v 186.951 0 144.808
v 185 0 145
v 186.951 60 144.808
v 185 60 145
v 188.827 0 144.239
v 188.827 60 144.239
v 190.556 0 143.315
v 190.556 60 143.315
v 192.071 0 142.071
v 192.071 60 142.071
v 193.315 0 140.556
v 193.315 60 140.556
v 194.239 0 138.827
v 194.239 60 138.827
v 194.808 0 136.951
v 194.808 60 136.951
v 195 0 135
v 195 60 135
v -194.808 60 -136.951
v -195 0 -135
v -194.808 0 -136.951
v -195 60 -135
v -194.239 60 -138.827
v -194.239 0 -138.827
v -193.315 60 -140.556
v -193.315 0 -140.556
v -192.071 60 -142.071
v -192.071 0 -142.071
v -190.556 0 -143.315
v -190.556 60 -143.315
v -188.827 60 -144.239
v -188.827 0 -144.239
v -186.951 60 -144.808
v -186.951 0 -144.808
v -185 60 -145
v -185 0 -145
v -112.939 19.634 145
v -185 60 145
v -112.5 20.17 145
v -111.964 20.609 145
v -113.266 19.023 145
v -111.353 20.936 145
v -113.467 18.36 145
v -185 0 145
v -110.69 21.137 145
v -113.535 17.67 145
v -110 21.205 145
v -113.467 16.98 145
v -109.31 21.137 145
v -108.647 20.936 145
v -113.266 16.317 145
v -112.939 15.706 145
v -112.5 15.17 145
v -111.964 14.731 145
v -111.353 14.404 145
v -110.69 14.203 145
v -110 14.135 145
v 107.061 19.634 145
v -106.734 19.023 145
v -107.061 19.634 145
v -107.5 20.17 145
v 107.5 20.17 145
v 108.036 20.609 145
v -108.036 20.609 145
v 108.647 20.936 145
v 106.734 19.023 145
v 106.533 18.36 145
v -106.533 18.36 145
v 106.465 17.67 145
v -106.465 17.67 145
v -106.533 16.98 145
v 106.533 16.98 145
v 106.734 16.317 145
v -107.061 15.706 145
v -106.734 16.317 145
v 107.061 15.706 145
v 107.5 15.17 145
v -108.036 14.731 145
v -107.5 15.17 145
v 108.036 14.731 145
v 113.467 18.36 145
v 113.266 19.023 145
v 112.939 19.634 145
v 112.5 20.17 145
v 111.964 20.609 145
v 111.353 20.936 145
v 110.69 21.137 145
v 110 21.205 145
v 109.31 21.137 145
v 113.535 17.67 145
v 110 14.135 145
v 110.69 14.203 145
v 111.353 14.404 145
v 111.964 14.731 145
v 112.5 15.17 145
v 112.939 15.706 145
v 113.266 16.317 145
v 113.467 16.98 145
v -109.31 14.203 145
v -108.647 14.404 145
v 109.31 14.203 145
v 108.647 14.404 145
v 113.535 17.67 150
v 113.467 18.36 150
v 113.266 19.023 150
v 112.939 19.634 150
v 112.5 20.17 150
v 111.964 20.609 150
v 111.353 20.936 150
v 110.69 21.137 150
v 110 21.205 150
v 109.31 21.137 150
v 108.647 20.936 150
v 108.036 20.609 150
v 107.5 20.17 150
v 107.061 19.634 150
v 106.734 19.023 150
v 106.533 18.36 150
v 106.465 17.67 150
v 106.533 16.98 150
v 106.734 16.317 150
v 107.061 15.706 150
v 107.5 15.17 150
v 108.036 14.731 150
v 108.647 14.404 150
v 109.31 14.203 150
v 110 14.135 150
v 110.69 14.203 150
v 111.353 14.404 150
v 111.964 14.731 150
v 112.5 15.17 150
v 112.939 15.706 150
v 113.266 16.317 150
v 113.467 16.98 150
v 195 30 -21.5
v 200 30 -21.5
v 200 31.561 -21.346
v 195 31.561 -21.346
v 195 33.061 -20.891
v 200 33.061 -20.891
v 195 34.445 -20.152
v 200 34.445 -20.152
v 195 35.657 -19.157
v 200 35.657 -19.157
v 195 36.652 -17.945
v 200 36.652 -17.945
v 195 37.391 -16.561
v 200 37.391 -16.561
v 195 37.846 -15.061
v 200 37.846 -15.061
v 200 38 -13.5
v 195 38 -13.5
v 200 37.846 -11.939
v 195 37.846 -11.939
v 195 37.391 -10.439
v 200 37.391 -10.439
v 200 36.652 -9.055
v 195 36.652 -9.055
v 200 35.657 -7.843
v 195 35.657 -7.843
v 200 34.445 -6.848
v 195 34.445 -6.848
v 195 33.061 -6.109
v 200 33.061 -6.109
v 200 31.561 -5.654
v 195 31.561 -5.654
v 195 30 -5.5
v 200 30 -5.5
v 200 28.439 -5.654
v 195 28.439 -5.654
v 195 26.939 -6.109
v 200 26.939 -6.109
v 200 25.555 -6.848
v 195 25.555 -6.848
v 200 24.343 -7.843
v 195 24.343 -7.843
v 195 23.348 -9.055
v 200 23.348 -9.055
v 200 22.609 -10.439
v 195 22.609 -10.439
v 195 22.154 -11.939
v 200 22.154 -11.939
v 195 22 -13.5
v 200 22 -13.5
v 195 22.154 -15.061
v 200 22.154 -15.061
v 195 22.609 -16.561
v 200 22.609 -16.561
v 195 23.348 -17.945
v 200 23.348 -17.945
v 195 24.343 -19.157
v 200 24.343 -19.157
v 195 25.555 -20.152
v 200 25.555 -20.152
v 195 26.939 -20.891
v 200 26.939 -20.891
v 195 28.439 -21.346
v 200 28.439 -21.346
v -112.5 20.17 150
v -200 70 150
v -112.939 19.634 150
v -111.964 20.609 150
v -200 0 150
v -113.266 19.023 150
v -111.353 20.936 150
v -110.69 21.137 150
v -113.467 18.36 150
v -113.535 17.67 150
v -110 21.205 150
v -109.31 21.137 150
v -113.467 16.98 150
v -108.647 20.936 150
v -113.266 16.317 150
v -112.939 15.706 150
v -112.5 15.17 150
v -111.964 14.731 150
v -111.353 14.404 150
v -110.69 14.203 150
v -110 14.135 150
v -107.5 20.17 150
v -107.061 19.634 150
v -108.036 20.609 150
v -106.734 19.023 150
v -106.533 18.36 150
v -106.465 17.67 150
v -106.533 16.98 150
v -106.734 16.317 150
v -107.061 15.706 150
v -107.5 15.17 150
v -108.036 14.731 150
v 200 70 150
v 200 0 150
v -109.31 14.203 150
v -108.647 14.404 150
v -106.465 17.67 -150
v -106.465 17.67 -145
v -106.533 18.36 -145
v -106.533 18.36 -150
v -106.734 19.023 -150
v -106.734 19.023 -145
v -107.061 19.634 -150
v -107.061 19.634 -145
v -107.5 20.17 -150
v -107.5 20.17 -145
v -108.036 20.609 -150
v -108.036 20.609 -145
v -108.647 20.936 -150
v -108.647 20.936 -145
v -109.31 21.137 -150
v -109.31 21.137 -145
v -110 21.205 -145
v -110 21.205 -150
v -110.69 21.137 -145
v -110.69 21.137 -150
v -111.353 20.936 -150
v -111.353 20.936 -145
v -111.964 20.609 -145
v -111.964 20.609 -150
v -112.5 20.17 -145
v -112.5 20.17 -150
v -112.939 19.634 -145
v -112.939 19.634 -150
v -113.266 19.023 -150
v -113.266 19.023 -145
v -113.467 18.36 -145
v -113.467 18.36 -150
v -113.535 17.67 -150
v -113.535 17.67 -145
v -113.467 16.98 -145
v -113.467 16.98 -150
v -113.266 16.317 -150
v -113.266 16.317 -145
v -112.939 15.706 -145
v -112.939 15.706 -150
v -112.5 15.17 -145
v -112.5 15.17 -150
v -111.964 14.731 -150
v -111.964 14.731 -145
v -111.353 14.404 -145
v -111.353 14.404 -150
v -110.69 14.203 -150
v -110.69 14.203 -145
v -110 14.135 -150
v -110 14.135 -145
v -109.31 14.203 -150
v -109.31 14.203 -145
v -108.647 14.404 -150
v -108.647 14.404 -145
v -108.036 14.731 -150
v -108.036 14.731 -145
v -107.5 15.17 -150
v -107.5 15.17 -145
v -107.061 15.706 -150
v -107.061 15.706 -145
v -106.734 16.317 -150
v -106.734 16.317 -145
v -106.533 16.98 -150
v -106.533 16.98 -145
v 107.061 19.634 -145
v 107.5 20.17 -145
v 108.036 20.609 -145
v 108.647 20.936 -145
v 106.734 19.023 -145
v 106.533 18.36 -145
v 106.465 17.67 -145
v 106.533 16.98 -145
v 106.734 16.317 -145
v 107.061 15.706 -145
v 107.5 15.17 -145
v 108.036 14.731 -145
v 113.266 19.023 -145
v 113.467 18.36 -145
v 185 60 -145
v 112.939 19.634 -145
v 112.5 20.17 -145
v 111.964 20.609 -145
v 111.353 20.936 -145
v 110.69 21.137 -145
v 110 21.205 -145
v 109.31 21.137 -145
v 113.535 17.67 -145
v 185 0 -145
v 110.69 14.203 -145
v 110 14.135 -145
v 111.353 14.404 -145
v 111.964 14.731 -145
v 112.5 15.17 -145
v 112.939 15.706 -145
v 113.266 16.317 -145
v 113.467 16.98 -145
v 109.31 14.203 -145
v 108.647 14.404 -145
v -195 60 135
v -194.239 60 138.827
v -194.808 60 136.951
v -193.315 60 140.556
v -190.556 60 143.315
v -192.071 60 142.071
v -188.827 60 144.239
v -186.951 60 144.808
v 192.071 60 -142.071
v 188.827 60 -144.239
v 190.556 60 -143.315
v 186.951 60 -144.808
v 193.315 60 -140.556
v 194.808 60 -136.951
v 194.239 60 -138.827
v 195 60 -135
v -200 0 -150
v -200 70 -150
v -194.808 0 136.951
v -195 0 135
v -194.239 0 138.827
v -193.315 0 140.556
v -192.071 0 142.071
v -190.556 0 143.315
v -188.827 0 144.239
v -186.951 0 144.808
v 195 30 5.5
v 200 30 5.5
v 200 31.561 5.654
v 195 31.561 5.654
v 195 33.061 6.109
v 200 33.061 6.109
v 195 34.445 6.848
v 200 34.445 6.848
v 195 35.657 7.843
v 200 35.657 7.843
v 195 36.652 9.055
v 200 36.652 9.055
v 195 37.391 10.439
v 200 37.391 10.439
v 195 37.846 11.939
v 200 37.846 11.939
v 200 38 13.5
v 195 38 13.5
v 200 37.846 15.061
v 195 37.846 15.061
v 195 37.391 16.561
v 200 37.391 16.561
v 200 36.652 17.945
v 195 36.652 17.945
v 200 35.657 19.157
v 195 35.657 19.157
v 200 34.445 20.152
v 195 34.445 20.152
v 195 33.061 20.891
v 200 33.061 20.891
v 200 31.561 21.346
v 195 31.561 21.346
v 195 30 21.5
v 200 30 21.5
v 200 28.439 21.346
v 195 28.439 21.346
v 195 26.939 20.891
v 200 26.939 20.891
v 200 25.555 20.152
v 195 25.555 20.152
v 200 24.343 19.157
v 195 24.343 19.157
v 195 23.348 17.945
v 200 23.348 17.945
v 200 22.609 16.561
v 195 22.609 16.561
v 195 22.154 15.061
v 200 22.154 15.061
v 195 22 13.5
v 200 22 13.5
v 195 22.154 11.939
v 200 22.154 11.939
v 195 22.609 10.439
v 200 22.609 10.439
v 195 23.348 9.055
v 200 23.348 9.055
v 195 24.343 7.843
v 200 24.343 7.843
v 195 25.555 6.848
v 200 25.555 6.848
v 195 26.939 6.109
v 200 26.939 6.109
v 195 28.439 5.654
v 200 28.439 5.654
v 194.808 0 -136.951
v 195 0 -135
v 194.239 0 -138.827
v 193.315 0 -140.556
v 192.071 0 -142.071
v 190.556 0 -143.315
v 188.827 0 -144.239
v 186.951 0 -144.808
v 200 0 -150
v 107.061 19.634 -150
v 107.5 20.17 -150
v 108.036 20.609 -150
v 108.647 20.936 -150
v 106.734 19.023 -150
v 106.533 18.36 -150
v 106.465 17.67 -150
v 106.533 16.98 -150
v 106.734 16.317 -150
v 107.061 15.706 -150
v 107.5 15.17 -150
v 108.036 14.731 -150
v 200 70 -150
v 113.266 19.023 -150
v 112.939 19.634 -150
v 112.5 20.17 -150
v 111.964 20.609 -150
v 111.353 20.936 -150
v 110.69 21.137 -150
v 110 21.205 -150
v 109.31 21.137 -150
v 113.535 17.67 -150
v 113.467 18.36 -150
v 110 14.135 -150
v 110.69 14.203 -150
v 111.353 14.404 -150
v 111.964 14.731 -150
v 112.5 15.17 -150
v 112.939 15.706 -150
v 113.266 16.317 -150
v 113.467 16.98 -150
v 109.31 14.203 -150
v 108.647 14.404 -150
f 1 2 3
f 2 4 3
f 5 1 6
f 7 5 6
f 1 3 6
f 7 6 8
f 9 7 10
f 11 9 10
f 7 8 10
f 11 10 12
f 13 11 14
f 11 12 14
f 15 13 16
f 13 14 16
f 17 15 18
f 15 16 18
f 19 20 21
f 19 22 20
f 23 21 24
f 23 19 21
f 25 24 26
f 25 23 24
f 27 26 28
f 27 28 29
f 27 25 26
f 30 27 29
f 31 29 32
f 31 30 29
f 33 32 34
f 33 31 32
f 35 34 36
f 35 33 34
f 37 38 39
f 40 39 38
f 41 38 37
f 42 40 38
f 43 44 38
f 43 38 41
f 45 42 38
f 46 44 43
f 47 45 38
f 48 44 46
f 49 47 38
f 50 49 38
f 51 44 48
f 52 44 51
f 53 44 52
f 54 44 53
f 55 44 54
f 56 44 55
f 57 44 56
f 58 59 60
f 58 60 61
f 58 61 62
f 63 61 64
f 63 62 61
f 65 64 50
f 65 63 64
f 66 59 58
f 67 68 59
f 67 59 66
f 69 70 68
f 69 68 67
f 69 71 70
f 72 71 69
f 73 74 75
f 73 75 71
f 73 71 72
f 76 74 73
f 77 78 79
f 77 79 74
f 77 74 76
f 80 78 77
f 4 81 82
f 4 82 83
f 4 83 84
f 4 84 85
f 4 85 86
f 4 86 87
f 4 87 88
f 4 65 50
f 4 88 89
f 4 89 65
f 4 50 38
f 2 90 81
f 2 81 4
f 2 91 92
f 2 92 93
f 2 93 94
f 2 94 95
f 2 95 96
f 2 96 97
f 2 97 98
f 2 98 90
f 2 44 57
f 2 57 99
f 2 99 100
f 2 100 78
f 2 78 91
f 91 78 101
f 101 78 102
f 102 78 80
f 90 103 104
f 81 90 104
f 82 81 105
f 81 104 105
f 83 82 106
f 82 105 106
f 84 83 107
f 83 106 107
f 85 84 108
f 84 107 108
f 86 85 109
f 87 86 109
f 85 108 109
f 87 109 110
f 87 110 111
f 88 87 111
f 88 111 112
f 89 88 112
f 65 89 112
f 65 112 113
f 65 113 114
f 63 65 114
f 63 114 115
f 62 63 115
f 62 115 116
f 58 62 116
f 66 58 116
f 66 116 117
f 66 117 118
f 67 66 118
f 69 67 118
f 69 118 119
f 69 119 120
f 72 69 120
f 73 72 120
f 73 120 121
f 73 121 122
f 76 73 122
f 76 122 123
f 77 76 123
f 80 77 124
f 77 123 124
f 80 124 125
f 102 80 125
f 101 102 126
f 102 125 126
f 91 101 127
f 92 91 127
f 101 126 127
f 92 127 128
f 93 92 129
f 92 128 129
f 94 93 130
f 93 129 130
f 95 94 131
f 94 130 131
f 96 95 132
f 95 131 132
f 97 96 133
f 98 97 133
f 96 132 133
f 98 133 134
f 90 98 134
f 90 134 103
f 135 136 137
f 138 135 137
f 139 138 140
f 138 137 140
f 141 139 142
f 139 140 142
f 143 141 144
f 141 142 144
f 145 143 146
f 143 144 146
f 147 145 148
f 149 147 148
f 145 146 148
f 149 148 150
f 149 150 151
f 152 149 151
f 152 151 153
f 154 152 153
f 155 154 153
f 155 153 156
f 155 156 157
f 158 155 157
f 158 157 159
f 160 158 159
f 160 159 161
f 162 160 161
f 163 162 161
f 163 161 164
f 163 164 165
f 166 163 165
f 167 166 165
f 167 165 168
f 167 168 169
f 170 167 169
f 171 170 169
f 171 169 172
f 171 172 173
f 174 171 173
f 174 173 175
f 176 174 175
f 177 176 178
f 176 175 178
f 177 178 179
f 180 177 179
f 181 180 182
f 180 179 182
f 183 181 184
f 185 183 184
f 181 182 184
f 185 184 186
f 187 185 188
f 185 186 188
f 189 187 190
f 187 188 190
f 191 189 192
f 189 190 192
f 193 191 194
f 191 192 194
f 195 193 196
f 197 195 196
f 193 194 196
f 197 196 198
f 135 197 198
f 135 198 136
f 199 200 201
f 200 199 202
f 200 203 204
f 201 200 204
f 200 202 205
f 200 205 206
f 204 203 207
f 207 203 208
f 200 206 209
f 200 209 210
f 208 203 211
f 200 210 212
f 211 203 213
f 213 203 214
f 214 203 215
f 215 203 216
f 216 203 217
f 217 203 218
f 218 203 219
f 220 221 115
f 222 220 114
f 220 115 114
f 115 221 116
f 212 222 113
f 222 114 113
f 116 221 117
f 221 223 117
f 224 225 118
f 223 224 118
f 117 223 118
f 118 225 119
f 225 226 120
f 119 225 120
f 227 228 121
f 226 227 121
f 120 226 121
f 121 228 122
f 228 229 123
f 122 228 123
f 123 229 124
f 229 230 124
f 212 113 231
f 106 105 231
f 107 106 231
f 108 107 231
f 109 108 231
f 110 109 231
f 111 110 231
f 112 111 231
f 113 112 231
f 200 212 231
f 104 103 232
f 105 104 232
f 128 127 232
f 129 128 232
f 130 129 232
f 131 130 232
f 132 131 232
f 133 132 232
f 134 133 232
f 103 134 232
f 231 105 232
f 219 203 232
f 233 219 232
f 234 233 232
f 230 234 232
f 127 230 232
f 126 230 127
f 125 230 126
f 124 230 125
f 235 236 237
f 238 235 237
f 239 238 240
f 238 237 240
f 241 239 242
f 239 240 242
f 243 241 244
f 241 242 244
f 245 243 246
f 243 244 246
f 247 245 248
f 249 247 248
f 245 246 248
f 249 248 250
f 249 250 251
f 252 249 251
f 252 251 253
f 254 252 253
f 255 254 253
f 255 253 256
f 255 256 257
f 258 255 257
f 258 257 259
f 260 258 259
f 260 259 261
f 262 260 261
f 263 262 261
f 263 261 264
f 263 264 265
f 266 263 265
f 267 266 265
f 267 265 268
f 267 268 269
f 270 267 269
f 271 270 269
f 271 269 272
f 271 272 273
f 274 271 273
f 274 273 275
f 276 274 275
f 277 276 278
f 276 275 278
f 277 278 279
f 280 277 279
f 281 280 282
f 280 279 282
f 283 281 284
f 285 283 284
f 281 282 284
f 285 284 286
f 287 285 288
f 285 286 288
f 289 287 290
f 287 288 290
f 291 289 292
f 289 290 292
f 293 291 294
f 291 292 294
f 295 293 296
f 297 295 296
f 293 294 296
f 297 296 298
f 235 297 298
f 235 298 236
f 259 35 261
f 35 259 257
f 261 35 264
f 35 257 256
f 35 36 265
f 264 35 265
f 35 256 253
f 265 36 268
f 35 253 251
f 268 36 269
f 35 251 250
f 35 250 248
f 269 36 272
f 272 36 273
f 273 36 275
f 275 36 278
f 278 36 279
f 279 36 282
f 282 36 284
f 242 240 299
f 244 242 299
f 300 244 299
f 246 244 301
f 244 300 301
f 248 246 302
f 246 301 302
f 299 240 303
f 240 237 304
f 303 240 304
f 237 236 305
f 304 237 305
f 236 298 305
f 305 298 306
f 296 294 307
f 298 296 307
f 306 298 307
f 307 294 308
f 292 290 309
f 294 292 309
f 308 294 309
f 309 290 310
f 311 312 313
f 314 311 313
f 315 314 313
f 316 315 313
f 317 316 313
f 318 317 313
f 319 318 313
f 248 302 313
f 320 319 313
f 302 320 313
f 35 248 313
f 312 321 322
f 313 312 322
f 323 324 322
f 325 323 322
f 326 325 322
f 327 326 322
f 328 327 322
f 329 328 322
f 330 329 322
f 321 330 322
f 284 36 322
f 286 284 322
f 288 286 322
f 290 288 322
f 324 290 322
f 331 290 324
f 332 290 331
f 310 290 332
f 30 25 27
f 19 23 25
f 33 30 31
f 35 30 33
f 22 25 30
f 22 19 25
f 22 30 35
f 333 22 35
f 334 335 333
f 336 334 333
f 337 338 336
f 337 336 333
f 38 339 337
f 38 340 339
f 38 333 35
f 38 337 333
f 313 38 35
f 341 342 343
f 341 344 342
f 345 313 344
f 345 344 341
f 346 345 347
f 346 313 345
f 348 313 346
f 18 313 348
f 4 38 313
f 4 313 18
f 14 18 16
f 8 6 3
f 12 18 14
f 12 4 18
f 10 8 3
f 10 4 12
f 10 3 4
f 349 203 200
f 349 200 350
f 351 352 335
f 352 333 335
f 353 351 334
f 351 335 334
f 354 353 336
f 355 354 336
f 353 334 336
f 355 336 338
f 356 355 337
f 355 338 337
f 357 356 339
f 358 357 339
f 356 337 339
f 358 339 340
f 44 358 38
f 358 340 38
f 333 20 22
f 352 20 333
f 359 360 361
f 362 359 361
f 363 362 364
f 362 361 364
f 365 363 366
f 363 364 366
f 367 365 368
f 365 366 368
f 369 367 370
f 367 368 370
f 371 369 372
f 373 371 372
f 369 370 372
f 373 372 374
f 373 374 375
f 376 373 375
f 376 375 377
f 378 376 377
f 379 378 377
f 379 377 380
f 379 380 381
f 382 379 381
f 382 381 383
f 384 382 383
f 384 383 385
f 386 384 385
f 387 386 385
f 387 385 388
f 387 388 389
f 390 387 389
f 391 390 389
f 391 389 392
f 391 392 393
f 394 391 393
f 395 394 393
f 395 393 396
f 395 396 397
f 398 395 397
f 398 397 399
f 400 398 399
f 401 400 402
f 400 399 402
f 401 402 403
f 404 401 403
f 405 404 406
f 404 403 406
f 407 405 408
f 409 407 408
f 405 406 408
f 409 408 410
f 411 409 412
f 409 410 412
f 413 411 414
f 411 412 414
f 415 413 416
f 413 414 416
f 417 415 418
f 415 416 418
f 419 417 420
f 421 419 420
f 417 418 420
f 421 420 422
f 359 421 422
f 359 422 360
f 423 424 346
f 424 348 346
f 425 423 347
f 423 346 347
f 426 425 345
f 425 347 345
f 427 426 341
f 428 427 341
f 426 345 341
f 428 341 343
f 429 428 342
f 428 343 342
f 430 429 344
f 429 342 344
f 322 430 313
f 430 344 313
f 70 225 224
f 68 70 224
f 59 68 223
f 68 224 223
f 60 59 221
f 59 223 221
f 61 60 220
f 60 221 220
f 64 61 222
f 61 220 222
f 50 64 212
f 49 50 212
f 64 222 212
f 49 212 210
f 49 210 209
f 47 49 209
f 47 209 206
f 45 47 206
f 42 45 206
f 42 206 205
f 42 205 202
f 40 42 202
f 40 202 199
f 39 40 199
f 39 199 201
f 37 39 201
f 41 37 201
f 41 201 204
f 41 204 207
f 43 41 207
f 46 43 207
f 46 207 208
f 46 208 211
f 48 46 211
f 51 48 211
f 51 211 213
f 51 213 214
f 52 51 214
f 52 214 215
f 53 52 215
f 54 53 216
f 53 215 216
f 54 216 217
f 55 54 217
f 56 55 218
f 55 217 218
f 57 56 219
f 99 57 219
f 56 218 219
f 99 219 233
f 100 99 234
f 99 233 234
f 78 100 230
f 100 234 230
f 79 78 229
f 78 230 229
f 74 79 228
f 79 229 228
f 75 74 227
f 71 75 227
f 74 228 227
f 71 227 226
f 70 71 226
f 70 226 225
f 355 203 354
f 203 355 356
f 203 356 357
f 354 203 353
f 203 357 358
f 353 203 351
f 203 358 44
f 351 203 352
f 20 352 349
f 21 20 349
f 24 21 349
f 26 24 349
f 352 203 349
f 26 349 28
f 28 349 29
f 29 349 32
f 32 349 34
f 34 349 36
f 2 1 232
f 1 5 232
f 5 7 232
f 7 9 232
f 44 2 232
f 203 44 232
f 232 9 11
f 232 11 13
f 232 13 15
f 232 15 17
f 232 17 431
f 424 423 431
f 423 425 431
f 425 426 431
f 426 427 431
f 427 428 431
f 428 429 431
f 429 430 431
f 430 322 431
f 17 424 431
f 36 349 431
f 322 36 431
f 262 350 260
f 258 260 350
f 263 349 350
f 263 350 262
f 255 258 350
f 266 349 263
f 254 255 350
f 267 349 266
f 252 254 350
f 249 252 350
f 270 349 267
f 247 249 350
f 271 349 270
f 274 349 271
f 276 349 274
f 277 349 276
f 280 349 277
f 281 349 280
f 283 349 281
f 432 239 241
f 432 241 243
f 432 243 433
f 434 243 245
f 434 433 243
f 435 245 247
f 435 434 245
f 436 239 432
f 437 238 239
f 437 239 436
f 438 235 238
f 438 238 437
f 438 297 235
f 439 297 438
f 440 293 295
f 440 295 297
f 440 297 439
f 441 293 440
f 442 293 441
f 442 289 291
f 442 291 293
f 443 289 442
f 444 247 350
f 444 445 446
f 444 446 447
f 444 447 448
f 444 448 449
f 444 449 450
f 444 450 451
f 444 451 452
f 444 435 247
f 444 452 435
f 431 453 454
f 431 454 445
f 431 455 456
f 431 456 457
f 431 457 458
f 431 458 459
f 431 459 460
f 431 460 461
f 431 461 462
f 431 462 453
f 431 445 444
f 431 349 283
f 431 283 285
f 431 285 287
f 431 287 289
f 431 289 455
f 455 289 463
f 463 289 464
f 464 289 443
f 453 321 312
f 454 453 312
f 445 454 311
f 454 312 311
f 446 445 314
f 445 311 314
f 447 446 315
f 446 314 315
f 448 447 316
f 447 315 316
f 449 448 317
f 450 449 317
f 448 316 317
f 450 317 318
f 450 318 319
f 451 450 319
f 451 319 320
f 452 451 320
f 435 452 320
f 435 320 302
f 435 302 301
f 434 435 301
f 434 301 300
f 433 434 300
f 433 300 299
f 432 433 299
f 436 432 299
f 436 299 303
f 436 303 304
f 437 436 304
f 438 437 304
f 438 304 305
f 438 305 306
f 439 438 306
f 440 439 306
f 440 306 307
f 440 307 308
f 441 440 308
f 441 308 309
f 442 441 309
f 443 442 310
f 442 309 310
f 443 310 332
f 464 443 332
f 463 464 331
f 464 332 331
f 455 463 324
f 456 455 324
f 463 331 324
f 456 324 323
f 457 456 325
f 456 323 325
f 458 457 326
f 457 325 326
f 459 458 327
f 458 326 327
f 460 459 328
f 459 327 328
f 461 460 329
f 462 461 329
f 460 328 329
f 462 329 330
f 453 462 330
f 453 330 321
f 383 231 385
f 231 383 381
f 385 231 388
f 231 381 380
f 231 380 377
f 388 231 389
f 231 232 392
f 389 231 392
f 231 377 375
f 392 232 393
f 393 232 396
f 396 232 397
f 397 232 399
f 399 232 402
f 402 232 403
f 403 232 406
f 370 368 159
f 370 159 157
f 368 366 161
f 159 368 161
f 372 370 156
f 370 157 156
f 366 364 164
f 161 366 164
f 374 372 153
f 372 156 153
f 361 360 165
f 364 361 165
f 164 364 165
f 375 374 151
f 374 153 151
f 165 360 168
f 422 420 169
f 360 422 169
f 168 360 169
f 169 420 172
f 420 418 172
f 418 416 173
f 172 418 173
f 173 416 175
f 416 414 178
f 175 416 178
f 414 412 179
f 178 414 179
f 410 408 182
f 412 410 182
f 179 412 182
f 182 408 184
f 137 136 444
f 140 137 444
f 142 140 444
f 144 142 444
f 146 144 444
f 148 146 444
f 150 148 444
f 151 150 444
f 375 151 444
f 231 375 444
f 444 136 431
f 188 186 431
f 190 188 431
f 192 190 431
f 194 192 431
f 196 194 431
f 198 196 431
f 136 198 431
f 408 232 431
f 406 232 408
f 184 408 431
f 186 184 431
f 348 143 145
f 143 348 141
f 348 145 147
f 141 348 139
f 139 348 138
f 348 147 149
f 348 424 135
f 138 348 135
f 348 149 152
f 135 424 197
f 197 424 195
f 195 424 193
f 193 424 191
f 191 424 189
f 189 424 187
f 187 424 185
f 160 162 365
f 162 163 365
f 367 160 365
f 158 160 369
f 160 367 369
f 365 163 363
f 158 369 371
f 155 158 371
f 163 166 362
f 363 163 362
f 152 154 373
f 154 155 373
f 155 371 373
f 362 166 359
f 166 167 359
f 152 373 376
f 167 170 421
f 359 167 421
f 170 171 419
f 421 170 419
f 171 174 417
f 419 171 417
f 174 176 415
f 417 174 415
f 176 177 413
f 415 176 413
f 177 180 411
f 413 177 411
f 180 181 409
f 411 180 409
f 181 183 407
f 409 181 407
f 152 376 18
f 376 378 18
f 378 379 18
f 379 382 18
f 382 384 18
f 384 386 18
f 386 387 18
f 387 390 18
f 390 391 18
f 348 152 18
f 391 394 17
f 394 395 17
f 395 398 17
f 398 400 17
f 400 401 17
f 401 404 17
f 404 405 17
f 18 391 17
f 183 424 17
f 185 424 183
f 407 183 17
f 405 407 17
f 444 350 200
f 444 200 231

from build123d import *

# Parameters (mm, degrees)
SKETCH1_W           = 400
SKETCH1_H           = 300
BOSS_EXTRUDE1_DEPTH = 70
SKETCH2_W           = 390
SKETCH2_H           = 290
CUT_EXTRUDE1_DEPTH  = 60
FILLET2_R           = 10
SKETCH6_R           = 8
CUT_EXTRUDE3_DEPTH  = 10
SKETCH7_R           = 3.535
CUT_EXTRUDE4_DEPTH  = 459


with BuildPart() as part:
    # Sketch1 → Boss-Extrude1 (new body)
    with BuildSketch(Plane(origin=(0, 0, 0), x_dir=(1, 0, 0), z_dir=(0, 1, 0))):
        Rectangle(SKETCH1_W, SKETCH1_H)
    extrude(amount=BOSS_EXTRUDE1_DEPTH)

    # Sketch2 → Cut-Extrude1 (cut)
    with BuildSketch(Plane.XZ):
        Rectangle(SKETCH2_W, SKETCH2_H)
    extrude(amount=-CUT_EXTRUDE1_DEPTH, mode=Mode.SUBTRACT)

    # Fillet2
    fillet2_edges = [part.edges().sort_by_distance(p)[0] for p in [
        (195, 30, 145),
        (195, 30, -145),
        (-195, 30, -145),
        (-195, 30, 145),
    ]]
    fillet(fillet2_edges, radius=FILLET2_R)

    # Sketch6 → Cut-Extrude3 (cut)
    with BuildSketch(Plane(origin=(200, 0, 0), x_dir=(0, 0, -1), z_dir=(1, 0, 0))):
        with Locations((-13.5, 30)):
            Circle(SKETCH6_R)
        with Locations((13.5, 30)):
            Circle(SKETCH6_R)
    extrude(amount=-CUT_EXTRUDE3_DEPTH, mode=Mode.SUBTRACT)

    # Sketch7 → Cut-Extrude4 (cut)
    with BuildSketch(Plane.XY.offset(150)):
        with Locations((-110, 17.670088152)):
            Circle(SKETCH7_R)
        with Locations((110, 17.670088152)):
            Circle(SKETCH7_R)
    extrude(amount=-CUT_EXTRUDE4_DEPTH, mode=Mode.SUBTRACT)


solid = part.part
